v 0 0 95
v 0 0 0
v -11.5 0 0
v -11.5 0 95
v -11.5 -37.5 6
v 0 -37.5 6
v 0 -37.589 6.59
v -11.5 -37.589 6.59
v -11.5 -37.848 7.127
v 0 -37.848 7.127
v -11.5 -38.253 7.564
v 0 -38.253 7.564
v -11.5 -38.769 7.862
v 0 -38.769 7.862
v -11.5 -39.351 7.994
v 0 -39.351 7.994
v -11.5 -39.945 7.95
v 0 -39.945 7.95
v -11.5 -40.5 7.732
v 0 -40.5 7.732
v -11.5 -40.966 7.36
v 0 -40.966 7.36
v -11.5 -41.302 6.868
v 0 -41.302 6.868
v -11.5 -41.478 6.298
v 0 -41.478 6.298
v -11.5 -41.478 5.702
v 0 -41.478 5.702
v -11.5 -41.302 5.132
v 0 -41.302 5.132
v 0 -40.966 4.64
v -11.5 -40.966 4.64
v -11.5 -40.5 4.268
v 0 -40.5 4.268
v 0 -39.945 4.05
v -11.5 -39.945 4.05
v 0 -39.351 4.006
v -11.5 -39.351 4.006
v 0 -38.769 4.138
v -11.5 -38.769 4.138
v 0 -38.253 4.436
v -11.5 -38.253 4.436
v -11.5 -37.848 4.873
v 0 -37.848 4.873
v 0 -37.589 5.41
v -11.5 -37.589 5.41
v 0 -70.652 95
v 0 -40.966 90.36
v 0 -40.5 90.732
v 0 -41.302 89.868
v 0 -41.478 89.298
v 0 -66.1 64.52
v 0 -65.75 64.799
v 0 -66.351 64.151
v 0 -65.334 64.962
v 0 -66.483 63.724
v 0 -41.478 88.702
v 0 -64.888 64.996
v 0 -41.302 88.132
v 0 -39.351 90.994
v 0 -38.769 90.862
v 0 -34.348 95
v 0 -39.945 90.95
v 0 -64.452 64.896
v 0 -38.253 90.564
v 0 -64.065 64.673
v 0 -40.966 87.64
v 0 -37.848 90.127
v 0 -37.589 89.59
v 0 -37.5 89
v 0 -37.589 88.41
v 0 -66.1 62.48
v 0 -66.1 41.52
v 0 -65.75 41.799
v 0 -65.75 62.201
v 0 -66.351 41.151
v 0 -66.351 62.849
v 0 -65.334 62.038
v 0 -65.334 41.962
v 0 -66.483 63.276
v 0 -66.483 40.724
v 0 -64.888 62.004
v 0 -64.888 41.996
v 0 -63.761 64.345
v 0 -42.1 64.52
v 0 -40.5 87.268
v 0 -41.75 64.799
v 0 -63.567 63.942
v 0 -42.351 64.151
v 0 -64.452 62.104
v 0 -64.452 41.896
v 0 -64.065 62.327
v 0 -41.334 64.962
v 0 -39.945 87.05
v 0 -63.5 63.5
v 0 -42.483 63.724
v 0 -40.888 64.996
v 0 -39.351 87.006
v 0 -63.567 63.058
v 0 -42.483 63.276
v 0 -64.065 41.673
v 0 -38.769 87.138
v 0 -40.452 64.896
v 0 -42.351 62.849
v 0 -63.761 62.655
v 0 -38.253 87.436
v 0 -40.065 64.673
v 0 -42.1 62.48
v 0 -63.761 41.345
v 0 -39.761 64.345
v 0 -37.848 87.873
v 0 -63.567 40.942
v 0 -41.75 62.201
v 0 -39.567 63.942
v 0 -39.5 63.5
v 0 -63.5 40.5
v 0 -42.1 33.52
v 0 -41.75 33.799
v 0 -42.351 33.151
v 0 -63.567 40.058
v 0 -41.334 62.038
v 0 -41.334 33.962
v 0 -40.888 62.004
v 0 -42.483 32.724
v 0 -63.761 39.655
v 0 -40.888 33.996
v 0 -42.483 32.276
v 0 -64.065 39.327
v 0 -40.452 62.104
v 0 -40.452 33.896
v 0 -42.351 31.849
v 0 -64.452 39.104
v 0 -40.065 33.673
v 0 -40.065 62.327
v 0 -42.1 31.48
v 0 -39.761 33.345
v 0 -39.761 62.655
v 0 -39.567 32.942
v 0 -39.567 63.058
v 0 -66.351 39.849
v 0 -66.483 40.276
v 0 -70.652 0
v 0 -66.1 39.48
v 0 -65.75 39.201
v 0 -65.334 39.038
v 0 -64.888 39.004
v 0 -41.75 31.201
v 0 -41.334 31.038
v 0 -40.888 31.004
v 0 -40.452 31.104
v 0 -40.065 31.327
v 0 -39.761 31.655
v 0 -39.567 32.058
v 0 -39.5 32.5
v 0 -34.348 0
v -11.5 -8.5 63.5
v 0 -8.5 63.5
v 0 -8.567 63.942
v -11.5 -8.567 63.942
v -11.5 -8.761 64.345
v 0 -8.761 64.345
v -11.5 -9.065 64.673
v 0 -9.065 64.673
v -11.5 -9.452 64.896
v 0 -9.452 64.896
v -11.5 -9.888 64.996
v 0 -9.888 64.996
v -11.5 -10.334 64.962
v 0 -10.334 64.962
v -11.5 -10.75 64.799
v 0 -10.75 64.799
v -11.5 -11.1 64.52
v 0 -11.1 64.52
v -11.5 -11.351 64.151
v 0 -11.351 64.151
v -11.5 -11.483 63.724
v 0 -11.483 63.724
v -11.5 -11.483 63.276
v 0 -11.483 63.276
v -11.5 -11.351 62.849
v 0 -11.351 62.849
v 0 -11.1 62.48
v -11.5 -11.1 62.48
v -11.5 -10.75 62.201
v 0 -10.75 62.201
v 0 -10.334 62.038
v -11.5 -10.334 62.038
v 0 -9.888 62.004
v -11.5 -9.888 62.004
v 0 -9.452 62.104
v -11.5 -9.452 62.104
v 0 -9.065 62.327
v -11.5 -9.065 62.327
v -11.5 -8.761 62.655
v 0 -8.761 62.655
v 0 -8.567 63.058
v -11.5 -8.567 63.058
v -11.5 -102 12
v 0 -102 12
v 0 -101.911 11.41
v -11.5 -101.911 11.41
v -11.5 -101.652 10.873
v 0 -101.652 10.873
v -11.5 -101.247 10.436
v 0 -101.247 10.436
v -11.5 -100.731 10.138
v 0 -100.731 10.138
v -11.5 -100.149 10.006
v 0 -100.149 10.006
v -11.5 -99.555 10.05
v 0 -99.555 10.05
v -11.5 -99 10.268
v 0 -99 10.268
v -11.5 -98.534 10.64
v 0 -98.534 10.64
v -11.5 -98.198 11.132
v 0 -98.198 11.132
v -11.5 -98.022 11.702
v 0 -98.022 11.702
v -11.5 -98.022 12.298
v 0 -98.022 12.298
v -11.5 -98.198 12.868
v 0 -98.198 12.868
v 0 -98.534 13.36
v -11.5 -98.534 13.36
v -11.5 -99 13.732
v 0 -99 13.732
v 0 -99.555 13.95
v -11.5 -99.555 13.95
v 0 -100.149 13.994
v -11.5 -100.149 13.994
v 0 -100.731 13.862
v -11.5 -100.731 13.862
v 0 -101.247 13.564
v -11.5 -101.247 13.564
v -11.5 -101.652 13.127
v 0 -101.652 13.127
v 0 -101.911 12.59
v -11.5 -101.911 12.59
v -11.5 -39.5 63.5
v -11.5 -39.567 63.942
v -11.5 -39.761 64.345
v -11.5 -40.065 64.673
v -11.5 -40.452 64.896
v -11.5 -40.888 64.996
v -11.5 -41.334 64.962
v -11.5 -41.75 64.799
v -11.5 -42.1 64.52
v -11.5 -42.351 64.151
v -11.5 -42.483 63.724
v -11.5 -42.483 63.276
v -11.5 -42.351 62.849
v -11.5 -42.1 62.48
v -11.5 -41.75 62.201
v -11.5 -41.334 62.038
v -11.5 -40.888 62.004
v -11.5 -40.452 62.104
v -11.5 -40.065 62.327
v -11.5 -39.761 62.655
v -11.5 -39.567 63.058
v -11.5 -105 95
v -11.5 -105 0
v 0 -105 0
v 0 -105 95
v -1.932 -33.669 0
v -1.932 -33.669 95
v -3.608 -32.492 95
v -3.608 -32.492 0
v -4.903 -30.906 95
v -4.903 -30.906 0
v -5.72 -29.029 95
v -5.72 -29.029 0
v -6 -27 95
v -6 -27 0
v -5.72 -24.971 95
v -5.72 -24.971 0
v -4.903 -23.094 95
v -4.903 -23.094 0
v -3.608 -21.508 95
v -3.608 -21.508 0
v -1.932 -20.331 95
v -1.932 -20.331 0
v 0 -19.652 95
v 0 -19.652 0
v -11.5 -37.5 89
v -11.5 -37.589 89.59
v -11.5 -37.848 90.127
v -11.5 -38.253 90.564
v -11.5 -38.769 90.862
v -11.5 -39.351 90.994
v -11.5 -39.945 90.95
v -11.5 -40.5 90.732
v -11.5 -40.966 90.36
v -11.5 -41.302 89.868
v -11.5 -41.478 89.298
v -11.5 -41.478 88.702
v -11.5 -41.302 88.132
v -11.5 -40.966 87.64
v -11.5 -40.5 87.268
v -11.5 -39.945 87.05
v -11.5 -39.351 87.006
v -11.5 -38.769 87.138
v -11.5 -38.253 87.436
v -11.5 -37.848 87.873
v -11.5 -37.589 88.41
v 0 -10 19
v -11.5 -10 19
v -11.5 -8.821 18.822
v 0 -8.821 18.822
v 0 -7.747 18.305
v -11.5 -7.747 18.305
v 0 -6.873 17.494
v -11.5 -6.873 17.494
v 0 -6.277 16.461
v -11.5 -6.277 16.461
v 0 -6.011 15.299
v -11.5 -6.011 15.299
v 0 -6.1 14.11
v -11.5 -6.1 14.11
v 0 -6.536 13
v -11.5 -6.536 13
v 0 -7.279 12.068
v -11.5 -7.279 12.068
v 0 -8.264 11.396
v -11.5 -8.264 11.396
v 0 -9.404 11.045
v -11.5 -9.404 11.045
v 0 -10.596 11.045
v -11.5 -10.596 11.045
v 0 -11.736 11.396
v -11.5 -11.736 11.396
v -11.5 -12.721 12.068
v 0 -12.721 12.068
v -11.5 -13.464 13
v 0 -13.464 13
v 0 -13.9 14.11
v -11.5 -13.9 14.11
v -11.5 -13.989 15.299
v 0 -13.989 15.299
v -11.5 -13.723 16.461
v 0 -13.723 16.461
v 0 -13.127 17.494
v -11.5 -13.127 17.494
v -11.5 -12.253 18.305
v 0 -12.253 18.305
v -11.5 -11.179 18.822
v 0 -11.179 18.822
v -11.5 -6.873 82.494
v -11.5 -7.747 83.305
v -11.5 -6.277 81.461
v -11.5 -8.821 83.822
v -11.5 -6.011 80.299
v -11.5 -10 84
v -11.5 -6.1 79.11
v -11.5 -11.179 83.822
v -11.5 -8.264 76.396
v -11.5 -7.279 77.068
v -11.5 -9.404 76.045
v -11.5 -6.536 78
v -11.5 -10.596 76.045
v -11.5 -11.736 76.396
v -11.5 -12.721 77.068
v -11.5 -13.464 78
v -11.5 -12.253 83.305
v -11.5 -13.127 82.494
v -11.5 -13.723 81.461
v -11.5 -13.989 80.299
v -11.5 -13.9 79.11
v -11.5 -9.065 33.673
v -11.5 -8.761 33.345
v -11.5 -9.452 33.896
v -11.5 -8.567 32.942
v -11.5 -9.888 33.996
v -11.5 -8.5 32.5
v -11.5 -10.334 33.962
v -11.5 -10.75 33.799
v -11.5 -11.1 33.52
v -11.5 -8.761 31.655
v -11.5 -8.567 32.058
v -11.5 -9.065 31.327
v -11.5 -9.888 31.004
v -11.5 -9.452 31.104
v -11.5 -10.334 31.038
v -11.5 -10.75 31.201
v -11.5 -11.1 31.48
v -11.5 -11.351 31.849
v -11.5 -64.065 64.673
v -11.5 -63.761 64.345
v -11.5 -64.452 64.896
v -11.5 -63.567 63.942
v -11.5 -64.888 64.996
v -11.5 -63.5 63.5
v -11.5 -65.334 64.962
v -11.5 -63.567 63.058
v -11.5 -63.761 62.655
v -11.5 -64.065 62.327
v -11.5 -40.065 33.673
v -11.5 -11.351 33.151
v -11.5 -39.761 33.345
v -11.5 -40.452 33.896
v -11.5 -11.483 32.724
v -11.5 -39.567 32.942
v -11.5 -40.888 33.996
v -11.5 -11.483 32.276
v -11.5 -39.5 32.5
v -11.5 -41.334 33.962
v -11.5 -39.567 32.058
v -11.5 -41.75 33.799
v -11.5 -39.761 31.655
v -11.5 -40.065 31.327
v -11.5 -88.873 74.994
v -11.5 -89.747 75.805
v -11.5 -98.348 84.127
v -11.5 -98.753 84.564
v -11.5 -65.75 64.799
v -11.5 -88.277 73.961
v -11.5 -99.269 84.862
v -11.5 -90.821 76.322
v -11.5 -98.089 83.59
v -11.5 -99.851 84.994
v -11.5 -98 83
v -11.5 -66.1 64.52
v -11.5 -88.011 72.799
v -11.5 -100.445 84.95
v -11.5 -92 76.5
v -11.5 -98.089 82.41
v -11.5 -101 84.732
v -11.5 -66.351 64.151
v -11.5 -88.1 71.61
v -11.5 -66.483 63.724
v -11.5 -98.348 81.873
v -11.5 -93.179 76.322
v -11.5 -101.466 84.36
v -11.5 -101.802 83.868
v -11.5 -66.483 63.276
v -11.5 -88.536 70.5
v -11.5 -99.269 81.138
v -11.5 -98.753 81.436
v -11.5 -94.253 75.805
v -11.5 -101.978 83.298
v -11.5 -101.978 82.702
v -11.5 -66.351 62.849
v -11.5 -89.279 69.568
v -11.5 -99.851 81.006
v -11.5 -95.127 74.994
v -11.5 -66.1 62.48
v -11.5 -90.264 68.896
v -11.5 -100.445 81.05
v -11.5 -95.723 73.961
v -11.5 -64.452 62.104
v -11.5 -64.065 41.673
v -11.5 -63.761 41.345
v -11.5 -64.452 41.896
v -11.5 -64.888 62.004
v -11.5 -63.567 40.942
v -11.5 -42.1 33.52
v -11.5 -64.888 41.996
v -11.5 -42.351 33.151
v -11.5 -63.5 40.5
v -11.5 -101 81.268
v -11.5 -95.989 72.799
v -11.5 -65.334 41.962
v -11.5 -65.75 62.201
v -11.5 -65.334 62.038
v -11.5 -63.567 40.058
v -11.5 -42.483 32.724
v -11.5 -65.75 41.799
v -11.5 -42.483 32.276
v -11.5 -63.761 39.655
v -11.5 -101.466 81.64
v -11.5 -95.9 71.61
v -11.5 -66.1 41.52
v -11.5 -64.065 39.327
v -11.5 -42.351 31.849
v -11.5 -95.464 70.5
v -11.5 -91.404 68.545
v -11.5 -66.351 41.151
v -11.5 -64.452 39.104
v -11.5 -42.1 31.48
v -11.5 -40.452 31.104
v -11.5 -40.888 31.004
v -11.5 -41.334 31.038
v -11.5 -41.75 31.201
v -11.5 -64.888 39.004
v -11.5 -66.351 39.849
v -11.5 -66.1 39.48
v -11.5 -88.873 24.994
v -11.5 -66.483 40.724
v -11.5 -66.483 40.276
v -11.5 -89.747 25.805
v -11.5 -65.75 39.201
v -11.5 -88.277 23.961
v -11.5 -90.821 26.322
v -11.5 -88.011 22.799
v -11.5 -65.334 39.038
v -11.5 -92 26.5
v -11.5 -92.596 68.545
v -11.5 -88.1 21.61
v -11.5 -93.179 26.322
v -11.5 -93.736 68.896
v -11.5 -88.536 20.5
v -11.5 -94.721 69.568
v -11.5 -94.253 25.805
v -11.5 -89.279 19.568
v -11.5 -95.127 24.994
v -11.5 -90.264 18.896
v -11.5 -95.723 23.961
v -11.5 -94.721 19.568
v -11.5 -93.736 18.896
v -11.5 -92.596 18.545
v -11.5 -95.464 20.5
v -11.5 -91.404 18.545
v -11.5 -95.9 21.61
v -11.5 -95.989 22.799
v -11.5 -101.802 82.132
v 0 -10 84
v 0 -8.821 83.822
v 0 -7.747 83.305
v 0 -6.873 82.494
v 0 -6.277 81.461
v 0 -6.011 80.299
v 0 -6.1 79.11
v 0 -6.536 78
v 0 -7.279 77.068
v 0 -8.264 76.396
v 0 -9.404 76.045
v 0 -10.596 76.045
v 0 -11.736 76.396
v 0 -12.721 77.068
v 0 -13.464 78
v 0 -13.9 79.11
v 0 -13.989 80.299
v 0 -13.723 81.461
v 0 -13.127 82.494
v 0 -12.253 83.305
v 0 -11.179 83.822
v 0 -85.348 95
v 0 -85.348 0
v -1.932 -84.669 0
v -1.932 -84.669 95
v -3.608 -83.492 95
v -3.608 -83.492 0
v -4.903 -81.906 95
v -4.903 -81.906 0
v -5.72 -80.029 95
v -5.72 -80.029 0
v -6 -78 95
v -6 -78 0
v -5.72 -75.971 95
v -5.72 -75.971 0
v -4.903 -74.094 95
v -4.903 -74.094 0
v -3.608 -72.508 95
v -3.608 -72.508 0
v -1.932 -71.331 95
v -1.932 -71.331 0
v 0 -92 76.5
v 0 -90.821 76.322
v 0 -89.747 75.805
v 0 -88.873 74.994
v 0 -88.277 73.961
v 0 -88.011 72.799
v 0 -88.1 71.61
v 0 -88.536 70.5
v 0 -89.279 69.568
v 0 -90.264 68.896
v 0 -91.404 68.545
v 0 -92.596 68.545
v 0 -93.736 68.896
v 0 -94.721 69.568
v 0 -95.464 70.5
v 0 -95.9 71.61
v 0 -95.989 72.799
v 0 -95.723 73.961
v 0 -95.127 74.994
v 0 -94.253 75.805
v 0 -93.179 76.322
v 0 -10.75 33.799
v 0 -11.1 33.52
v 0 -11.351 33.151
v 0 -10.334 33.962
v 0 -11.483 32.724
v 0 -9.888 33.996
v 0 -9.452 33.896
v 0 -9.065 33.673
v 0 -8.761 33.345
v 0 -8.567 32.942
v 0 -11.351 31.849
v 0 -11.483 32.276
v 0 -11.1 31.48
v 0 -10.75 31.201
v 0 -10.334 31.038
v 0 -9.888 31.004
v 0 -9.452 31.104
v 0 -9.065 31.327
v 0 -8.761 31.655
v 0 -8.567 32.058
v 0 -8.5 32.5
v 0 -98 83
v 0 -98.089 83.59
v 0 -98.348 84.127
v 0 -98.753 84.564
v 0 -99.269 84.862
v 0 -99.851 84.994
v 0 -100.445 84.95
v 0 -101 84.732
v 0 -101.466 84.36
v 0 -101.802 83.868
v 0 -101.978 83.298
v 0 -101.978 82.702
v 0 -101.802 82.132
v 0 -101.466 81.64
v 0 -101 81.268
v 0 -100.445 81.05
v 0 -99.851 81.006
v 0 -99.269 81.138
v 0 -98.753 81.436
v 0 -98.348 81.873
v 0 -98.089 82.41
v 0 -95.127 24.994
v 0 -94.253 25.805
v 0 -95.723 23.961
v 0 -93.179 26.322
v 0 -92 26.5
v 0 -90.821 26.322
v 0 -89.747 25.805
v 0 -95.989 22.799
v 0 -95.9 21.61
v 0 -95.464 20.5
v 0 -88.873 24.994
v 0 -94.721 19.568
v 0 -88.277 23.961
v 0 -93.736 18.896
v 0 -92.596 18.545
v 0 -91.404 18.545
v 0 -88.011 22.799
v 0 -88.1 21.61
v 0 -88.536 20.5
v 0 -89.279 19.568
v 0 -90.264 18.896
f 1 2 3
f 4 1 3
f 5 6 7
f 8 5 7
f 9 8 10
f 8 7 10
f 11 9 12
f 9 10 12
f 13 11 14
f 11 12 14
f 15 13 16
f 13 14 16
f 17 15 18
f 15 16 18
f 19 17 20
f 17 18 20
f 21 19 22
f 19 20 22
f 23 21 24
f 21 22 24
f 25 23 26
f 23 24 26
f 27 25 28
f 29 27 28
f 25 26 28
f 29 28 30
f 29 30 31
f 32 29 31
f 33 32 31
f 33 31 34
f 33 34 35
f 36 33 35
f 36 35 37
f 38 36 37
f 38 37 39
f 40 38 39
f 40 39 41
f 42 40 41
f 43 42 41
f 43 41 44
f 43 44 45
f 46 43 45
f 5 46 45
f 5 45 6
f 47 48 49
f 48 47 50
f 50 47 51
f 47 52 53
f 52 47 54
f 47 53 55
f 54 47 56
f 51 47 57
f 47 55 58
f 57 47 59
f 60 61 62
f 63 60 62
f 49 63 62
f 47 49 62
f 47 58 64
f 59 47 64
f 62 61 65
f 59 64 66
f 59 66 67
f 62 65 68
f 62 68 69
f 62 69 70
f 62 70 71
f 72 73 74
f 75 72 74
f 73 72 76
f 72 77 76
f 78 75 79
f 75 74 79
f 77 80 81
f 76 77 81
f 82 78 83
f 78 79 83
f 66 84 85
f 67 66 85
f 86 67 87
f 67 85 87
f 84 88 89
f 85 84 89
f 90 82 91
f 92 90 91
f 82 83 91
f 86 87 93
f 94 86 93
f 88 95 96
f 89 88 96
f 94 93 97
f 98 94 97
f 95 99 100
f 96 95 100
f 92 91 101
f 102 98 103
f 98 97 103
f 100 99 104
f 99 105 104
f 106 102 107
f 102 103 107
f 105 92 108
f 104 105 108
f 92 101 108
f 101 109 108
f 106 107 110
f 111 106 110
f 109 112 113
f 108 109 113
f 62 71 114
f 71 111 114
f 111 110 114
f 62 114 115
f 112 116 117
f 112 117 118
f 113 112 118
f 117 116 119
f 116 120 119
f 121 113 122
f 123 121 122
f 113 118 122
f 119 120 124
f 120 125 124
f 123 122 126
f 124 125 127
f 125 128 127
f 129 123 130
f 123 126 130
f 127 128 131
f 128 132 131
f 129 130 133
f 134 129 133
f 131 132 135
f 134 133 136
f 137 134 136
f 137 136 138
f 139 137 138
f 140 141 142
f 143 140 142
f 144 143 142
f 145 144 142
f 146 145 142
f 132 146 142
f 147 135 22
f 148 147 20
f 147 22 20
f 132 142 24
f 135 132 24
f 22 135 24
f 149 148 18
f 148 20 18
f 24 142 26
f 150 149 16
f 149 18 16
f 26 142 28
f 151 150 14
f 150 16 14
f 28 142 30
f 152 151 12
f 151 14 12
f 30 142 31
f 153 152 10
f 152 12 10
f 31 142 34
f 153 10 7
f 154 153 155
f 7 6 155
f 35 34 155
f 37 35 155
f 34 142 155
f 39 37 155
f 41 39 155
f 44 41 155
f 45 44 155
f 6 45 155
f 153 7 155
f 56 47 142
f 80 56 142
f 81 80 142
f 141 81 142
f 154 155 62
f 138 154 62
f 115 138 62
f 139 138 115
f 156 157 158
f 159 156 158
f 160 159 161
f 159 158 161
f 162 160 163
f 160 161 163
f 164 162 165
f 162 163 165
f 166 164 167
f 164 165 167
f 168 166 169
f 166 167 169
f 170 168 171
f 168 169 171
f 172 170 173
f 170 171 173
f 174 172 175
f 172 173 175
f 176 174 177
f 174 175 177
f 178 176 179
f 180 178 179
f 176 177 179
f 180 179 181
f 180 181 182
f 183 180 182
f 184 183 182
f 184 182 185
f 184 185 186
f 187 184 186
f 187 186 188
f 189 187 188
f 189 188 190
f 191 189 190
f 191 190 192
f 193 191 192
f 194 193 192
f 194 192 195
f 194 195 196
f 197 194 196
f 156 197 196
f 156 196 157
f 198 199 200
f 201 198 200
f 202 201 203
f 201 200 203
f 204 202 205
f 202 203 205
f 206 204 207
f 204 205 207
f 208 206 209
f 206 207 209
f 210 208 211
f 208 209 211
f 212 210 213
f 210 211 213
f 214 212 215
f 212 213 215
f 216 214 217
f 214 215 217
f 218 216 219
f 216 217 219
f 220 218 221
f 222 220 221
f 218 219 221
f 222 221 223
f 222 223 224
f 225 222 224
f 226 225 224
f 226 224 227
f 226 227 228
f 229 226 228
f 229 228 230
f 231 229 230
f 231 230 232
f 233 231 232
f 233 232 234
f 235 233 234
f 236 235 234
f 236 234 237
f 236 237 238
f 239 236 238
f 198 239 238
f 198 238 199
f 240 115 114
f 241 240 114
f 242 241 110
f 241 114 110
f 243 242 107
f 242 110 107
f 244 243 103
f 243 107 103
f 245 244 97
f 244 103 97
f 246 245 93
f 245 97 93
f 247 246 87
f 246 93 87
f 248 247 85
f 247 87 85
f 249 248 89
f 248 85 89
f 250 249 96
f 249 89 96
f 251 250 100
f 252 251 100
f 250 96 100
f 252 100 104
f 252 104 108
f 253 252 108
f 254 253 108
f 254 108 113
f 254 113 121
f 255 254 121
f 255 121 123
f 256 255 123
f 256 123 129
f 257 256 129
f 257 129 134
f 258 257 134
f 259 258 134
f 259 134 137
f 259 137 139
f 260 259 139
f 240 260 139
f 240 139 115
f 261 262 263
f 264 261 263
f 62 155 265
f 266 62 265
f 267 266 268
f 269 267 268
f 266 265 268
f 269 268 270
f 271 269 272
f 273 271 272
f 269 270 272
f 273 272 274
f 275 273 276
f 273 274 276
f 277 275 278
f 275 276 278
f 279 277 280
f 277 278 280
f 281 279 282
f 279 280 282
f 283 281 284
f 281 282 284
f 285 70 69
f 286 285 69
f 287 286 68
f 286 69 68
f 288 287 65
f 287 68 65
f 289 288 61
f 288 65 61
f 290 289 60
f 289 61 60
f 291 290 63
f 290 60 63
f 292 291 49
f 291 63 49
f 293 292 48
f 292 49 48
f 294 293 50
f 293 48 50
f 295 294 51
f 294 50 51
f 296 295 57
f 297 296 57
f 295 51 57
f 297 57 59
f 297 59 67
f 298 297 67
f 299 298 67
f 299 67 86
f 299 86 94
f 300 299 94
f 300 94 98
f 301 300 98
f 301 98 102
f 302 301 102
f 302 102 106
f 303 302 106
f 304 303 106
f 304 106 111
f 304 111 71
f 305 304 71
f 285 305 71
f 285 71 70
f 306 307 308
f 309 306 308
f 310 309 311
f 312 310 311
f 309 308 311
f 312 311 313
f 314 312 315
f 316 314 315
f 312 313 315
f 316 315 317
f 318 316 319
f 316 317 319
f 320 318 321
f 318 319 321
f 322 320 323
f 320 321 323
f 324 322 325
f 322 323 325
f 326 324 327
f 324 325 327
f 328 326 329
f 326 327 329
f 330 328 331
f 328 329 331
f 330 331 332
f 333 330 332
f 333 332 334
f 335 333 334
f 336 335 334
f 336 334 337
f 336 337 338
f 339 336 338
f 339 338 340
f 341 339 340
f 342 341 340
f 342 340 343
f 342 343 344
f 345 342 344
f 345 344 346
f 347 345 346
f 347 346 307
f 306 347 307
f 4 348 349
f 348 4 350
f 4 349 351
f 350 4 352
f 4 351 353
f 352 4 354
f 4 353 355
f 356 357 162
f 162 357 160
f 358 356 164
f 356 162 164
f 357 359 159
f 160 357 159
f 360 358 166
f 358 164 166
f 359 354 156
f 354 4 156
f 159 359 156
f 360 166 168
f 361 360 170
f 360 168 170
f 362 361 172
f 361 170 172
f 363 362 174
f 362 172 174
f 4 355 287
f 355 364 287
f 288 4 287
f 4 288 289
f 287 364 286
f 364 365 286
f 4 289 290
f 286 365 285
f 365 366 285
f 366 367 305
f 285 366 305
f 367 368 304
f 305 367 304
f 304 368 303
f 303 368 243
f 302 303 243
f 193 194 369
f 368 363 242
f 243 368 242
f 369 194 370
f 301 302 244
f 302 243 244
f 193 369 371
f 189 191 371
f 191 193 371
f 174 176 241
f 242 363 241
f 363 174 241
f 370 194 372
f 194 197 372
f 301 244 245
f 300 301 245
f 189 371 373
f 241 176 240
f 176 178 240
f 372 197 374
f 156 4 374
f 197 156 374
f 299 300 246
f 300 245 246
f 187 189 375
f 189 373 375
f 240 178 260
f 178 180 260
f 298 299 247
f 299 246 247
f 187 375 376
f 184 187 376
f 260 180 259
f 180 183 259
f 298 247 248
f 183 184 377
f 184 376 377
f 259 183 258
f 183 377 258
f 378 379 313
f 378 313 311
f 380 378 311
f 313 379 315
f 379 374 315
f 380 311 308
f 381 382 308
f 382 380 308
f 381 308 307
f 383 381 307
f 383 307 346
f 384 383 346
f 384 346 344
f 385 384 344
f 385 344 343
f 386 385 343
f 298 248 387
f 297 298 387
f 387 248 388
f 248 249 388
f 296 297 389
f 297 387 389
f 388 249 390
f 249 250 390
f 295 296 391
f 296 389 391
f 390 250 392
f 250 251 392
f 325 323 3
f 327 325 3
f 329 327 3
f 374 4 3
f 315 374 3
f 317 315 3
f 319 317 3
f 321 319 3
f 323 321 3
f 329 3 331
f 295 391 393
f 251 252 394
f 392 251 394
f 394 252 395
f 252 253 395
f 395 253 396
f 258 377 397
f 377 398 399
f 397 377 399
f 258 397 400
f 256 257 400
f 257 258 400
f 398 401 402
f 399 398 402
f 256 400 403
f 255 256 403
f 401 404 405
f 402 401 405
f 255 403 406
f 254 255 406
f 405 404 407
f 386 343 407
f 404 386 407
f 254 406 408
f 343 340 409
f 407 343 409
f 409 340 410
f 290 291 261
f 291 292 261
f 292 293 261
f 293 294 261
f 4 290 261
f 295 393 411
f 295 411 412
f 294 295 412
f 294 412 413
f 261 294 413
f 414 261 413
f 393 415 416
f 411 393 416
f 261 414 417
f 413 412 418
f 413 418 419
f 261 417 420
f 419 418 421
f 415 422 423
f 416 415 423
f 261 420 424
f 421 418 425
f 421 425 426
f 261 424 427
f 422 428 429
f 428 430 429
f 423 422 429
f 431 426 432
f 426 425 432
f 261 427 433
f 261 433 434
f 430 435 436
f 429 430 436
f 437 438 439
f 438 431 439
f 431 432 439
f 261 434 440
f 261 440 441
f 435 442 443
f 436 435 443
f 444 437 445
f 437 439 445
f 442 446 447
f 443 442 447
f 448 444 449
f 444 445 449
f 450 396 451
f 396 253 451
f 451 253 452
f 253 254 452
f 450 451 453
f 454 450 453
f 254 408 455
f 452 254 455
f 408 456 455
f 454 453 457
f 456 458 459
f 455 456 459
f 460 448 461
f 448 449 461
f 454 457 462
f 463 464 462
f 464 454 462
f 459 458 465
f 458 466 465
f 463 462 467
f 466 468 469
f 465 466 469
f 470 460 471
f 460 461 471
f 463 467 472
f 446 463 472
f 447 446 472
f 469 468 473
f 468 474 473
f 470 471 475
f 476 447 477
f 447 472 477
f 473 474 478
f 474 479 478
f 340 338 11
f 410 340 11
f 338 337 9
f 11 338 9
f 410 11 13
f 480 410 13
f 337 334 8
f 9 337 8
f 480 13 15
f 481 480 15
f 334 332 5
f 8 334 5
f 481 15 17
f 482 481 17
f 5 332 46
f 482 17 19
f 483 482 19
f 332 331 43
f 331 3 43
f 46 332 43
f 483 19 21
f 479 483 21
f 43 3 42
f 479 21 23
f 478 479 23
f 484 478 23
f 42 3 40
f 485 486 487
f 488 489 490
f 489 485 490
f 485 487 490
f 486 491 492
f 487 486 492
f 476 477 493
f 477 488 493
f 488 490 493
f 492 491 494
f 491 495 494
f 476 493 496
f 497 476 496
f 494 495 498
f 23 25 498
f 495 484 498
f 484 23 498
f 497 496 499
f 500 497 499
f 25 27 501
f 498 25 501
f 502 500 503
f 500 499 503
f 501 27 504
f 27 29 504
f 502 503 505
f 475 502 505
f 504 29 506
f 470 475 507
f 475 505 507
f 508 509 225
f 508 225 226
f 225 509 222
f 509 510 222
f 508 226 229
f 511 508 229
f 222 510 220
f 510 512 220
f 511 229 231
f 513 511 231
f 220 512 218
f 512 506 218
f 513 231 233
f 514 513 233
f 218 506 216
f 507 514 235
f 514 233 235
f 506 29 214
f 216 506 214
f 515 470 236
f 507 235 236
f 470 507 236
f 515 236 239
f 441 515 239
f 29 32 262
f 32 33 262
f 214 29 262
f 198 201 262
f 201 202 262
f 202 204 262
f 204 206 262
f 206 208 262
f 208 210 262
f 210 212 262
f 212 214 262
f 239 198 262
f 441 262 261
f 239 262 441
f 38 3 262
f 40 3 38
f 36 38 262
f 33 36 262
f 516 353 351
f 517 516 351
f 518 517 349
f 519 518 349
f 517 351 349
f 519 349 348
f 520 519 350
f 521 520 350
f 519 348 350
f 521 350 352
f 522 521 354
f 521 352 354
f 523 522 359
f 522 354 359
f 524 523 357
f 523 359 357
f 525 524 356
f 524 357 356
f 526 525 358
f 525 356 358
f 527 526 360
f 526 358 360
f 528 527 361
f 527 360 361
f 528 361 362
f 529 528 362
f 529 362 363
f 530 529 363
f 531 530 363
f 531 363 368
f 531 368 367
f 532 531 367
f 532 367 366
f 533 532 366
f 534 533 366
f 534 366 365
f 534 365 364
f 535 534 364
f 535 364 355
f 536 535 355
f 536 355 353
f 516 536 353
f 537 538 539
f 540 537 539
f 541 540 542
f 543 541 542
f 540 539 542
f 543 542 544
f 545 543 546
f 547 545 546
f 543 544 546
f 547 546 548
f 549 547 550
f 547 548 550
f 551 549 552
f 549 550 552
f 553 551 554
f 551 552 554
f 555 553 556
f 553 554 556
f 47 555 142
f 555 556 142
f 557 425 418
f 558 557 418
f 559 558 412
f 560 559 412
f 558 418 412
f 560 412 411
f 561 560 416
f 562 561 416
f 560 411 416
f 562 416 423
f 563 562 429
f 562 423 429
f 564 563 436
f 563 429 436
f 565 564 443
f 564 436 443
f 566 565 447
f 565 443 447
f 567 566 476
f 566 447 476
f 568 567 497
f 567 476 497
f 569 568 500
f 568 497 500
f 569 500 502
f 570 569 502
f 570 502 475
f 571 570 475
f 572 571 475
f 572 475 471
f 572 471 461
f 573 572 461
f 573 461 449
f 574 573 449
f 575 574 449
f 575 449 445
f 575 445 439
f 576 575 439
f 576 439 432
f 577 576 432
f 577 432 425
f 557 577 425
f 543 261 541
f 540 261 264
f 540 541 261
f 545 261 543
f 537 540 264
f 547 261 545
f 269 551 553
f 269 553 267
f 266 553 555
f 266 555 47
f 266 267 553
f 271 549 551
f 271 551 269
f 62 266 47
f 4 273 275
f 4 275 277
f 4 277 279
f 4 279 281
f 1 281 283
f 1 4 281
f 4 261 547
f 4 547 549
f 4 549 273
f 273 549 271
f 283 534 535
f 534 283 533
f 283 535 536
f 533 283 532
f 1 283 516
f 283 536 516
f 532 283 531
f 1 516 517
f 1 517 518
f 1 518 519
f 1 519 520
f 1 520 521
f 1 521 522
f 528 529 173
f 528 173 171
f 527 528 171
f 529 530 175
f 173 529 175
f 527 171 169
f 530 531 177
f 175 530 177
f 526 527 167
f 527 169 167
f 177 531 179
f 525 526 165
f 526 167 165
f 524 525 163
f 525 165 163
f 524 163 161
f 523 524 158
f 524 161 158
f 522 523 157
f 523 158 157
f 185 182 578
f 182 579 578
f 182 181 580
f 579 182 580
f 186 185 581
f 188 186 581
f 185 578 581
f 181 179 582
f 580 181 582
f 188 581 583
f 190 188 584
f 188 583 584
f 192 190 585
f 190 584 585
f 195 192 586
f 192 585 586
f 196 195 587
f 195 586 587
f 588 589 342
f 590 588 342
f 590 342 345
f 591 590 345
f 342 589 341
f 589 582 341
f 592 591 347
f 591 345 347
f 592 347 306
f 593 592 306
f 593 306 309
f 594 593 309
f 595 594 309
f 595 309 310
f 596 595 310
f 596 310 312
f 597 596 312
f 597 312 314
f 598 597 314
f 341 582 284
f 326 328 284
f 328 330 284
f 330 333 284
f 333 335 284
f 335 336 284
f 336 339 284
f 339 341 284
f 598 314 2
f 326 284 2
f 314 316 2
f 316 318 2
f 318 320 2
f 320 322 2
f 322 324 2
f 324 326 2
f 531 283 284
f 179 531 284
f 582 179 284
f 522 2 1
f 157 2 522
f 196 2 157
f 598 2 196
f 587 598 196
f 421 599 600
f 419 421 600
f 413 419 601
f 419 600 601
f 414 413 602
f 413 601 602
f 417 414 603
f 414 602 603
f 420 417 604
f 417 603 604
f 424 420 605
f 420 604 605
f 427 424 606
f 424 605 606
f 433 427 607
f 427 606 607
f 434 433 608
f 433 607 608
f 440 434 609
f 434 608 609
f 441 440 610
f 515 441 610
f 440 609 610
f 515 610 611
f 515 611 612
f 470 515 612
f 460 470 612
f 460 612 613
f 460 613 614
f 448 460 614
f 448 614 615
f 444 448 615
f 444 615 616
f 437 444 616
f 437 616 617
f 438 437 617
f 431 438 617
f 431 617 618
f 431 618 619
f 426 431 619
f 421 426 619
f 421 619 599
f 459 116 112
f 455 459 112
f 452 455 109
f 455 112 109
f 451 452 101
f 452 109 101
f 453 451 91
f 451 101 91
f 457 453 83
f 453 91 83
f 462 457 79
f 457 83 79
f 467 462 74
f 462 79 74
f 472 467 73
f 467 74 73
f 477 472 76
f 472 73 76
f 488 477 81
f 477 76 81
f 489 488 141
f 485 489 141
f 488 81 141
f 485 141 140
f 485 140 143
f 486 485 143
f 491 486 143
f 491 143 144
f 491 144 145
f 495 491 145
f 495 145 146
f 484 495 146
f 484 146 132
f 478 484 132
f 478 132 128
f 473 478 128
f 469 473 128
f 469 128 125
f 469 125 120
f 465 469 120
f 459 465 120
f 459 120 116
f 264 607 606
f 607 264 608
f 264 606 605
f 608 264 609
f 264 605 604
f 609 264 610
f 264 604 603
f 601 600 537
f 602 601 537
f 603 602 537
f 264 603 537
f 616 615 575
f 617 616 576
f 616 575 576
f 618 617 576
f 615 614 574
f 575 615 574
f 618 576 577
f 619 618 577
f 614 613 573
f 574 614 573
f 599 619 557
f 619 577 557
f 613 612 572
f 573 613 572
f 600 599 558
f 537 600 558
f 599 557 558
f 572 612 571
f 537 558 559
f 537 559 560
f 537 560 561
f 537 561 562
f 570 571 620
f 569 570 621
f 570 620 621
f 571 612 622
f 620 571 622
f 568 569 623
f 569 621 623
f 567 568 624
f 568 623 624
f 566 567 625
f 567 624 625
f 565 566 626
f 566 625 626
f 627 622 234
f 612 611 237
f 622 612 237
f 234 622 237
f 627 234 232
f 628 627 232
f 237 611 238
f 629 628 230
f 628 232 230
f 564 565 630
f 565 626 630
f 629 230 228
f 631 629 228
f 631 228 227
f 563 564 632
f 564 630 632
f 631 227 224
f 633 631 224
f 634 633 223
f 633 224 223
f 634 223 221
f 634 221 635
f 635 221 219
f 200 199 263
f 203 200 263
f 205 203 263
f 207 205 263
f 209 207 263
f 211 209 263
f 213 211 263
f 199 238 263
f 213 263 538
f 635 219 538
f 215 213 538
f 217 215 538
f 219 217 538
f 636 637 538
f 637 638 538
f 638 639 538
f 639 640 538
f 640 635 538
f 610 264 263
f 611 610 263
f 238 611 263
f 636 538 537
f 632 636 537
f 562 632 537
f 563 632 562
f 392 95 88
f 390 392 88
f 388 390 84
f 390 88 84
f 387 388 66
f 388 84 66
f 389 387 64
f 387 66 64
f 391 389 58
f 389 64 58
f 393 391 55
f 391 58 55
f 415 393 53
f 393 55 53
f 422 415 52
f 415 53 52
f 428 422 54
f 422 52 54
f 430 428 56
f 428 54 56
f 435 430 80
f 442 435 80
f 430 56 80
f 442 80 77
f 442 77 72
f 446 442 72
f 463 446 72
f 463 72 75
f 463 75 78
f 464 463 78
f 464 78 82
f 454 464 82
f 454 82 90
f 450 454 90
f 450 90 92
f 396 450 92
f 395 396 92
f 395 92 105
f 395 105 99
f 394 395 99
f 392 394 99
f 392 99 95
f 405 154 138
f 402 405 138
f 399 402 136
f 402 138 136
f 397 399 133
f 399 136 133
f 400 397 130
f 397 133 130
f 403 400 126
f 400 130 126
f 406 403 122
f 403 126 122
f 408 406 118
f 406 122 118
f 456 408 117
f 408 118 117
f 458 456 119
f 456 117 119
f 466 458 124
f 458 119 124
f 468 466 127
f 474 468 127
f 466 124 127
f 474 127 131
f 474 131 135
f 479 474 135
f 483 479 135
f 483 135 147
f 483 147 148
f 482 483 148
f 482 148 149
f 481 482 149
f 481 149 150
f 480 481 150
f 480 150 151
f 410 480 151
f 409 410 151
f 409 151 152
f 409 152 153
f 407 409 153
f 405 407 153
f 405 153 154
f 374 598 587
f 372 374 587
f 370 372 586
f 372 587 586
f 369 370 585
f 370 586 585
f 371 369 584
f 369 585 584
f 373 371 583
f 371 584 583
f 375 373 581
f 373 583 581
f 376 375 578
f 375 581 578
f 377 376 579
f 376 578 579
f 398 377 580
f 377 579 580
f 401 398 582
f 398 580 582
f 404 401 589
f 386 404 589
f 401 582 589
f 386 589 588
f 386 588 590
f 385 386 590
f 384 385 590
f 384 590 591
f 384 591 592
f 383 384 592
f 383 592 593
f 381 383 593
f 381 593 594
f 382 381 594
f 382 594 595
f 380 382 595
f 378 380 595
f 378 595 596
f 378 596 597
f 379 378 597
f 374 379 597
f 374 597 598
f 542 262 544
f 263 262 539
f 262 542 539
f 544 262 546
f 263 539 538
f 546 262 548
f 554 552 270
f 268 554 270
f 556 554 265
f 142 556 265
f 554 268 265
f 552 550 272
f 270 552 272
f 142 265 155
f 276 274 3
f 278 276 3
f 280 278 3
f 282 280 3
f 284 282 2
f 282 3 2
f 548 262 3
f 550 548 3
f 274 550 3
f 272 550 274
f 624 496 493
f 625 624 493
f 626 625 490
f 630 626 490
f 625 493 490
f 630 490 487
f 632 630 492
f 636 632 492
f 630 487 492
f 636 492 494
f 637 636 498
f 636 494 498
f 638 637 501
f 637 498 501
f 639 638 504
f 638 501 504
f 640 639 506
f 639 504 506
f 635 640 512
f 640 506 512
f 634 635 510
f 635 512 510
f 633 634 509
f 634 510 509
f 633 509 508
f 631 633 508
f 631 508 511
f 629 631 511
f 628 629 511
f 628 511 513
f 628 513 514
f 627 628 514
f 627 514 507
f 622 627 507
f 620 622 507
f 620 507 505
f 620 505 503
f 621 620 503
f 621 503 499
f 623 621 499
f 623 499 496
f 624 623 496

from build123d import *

# Parameters (mm, degrees)
BOSS_EXTRUDE1_DEPTH               = 95
SKETCH2_R                         = 2
CUT_EXTRUDE1_DEPTH                = 143.06424603
ESQUISSE2_R                       = 2
ENL_V_MAT_EXTRU_2_DEPTH           = 143.06424603
ESQUISSE3_R                       = 4
ENL_V_MAT_EXTRU_3CNC_DEPTH        = 143.06424603
ESQUISSE4_R                       = 1.5
ENL_V_MAT_EXTRU_4_3DPRINTER_DEPTH = 143.06424603


with BuildPart() as part:
    # Sketch1 → Boss-Extrude1 (new body)
    with BuildSketch(Plane.XY):
        with BuildLine():
            Line((0, -19.651530772), (0, 0))
            Line((0, 0), (-11.5, 0))
            Line((-11.5, 0), (-11.5, -52.5))
            Line((-11.5, -52.5), (0, -52.5))
            Line((0, -52.5), (0, -34.348469228))
            ThreePointArc((0, -34.348469228), (-6, -27), (0, -19.651530772))
        make_face()
        with BuildLine():
            Line((0, -52.5), (-11.5, -52.5))
            Line((-11.5, -52.5), (-11.5, -105))
            Line((-11.5, -105), (0, -105))
            Line((0, -105), (0, -85.348469228))
            ThreePointArc((0, -85.348469228), (-6, -78), (0, -70.651530772))
            Line((0, -70.651530772), (0, -52.5))
        make_face()
    extrude(amount=BOSS_EXTRUDE1_DEPTH)

    # Sketch2 → Cut-Extrude1 (cut, through all)
    with BuildSketch(Plane(origin=(0, 0, 0), x_dir=(0, 0, -1), z_dir=(1, 0, 0))):
        with Locations(Location((-83, -100, 0), (0, 0, 90))):
            Circle(SKETCH2_R)
        with Locations(Location((-12, -100, 0), (0, 0, 270))):
            Circle(SKETCH2_R)
    extrude(amount=-CUT_EXTRUDE1_DEPTH, mode=Mode.SUBTRACT)

    # Esquisse2 → Enlèv. mat.-Extru.2 (cut, through all)
    with BuildSketch(Plane(origin=(0, 0, 0), x_dir=(0, 0, -1), z_dir=(1, 0, 0))):
        with Locations(Location((-6, -39.5, 0), (0, 0, 90))):
            Circle(ESQUISSE2_R)
        with Locations(Location((-89, -39.5, 0), (0, 0, 90))):
            Circle(ESQUISSE2_R)
    extrude(amount=-ENL_V_MAT_EXTRU_2_DEPTH, mode=Mode.SUBTRACT)

    # Esquisse3 → Enlèv. mat.-Extru.3CNC (cut, through all)
    with BuildSketch(Plane.ZY.offset(11.5)):
        with Locations((80, -10)):
            Circle(ESQUISSE3_R)
        with Locations((15, -10)):
            Circle(ESQUISSE3_R)
        with Locations((72.5, -92)):
            Circle(ESQUISSE3_R)
        with Locations((22.5, -92)):
            Circle(ESQUISSE3_R)
    extrude(amount=-ENL_V_MAT_EXTRU_3CNC_DEPTH, mode=Mode.SUBTRACT)

    # Esquisse4 → Enlèv. mat.-Extru.4-3Dprinter (cut, through all)
    with BuildSketch(Plane(origin=(0, 0, 0), x_dir=(0, 0, -1), z_dir=(1, 0, 0))):
        with Locations(Location((-32.5, -10, 0), (0, 0, 90))):
            Circle(ESQUISSE4_R)
        with Locations(Location((-63.5, -10, 0), (0, 0, 90))):
            Circle(ESQUISSE4_R)
        with Locations(Location((-63.5, -41, 0), (0, 0, 90))):
            Circle(ESQUISSE4_R)
        with Locations(Location((-32.5, -41, 0), (0, 0, 90))):
            Circle(ESQUISSE4_R)
        with Locations(Location((-40.5, -65, 0), (0, 0, 90))):
            Circle(ESQUISSE4_R)
        with Locations(Location((-63.5, -65, 0), (0, 0, 90))):
            Circle(ESQUISSE4_R)
    extrude(amount=-ENL_V_MAT_EXTRU_4_3DPRINTER_DEPTH, mode=Mode.SUBTRACT)


solid = part.part
